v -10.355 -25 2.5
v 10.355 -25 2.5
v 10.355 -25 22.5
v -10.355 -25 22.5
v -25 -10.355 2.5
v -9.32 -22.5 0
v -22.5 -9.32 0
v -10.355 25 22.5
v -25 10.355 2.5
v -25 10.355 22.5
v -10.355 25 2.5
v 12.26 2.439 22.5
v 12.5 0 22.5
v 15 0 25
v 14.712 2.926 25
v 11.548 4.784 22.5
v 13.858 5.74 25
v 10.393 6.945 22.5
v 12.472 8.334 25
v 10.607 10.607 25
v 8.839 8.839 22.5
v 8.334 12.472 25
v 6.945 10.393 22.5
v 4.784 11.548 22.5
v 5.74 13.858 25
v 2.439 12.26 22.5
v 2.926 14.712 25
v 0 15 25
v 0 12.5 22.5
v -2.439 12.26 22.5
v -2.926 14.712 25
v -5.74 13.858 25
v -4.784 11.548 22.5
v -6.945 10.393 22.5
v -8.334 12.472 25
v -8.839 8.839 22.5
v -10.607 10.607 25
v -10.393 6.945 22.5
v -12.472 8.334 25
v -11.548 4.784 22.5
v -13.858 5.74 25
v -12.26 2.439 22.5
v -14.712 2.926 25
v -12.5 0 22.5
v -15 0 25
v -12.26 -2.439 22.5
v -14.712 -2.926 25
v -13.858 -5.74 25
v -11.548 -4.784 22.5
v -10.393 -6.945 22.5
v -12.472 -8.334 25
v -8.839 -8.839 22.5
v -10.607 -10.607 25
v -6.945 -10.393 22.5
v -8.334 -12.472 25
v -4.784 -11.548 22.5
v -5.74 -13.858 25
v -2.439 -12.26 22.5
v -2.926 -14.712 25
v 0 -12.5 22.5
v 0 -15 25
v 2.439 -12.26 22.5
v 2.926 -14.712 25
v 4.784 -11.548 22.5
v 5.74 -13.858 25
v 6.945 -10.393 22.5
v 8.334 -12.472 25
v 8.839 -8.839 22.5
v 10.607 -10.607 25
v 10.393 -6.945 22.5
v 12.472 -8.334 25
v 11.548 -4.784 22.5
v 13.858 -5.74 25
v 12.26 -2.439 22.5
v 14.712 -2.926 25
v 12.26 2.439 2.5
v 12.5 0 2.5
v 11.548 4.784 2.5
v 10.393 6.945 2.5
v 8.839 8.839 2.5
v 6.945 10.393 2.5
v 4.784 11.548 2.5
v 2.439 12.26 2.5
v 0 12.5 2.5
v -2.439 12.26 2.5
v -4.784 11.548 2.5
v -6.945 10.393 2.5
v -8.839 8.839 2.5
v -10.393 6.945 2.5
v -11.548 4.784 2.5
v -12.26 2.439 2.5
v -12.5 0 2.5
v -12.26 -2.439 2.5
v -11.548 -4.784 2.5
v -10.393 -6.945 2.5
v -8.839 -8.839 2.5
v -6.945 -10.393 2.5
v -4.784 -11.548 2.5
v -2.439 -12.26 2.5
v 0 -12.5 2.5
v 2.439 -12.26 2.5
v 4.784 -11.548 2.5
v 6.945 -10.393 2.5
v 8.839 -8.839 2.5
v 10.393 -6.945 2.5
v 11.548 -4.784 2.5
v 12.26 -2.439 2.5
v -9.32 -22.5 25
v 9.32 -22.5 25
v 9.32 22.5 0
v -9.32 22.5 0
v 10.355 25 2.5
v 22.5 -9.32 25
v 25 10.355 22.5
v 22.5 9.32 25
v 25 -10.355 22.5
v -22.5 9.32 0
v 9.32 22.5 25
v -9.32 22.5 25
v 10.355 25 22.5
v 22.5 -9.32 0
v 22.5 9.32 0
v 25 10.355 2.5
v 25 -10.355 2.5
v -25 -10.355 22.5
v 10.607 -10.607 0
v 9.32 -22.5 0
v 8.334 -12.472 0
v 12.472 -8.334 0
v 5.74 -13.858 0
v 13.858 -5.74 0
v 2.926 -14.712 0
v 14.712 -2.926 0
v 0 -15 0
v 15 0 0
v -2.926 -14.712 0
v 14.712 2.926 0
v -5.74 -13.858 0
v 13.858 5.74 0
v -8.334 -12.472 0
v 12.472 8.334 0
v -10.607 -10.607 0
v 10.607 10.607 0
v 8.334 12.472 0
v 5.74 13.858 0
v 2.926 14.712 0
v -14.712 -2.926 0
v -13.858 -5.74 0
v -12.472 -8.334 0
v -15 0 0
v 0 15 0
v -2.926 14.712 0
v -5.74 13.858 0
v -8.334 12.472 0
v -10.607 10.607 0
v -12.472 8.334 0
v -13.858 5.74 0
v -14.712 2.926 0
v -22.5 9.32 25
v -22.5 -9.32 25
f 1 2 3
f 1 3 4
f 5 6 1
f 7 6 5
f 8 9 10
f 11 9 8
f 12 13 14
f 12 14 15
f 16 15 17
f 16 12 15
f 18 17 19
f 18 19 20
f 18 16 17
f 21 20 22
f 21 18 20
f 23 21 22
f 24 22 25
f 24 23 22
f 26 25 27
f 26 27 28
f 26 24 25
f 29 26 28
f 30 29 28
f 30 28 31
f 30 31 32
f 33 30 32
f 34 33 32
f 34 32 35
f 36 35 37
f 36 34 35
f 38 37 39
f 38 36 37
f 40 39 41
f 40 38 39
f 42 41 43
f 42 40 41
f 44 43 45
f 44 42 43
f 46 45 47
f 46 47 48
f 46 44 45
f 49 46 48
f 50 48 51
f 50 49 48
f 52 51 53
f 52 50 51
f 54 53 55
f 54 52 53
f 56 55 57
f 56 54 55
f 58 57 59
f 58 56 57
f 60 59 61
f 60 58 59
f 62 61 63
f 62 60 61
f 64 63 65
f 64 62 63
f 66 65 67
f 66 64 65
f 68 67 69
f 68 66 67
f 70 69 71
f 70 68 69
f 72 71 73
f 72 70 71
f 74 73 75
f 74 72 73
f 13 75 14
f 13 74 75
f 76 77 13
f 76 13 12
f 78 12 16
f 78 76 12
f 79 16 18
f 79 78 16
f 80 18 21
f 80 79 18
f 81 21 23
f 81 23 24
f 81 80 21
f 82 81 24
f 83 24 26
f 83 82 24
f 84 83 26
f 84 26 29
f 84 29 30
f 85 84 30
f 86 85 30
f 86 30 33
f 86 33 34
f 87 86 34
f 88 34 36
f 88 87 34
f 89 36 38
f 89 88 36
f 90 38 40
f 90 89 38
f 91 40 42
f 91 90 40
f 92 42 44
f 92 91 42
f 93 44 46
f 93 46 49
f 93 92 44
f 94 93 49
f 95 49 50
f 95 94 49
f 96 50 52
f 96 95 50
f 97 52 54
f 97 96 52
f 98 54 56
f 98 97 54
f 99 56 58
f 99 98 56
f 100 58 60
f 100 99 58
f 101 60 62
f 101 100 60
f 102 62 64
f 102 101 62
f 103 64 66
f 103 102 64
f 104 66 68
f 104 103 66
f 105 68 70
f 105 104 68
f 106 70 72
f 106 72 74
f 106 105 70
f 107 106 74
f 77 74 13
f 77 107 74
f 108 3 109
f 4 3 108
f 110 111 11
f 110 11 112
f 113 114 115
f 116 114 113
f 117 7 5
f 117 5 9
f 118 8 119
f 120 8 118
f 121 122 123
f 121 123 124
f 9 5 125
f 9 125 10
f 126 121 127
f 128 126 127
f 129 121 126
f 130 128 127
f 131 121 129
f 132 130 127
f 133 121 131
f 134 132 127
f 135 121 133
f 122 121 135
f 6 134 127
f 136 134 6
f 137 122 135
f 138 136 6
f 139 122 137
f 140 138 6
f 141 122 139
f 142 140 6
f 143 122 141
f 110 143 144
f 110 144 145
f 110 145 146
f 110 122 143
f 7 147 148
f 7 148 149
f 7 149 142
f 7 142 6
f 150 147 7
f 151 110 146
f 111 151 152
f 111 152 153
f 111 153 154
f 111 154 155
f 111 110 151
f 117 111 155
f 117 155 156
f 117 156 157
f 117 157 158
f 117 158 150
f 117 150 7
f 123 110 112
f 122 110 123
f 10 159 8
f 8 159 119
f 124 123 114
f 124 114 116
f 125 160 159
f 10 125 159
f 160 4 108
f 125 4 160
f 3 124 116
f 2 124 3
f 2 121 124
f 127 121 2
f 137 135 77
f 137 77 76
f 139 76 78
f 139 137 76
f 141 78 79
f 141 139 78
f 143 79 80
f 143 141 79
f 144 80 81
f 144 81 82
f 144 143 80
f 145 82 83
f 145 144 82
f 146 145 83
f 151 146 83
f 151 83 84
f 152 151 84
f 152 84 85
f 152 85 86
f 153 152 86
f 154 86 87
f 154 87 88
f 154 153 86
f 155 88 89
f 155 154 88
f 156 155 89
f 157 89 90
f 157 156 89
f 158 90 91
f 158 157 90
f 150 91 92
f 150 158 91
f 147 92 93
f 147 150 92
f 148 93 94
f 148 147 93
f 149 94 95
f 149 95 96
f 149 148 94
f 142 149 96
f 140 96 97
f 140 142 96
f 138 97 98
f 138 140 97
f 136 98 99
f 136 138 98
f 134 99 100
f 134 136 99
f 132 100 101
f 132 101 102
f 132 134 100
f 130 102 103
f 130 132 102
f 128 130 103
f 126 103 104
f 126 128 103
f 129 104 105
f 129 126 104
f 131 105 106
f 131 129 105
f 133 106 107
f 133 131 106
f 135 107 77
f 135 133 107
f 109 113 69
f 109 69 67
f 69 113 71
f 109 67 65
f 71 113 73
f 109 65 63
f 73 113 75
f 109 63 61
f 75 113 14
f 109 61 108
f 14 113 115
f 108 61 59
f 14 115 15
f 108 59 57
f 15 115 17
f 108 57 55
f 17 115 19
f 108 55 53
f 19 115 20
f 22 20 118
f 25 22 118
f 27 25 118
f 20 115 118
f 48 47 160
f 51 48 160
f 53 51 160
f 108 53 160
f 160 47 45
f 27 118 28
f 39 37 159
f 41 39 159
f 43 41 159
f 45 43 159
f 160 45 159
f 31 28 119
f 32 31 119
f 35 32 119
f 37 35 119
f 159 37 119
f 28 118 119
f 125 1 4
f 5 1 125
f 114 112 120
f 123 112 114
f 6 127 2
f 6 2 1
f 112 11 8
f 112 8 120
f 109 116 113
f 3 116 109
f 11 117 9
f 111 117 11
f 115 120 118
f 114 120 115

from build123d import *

# Parameters (mm, degrees)
SKETCH2_R      = 12.5
EXTRUDE2_DEPTH = 25
CHAMFER3_SIZE  = 2.5
CHAMFER4_SIZE  = 2.5


with BuildPart() as part:
    # Sketch2 → Extrude2 (new body)
    with BuildSketch(Plane.XY):
        Polygon((-25, 10.355339059), (-10.355339059, 25), (10.355339059, 25), (25, 10.355339059), (25, -10.355339059), (10.355339059, -25), (-10.355339059, -25), (-25, -10.355339059), align=None)
        Circle(SKETCH2_R, mode=Mode.SUBTRACT)
    extrude(amount=EXTRUDE2_DEPTH)

    # Chamfer3
    chamfer3_edges = [part.edges().sort_by_distance(p)[0] for p in [
        (-12.5, 0, 0),
        (17.67766953, 17.67766953, 0),
        (25, 0, 0),
        (17.67766953, -17.67766953, 0),
        (0, -25, 0),
        (-17.67766953, -17.67766953, 0),
        (-25, 0, 0),
        (-17.67766953, 17.67766953, 0),
        (0, 25, 0),
    ]]
    chamfer(chamfer3_edges, length=CHAMFER3_SIZE)

    # Chamfer4
    chamfer4_edges = [part.edges().sort_by_distance(p)[0] for p in [
        (-25, 0, 25),
        (-17.67766953, -17.67766953, 25),
        (0, -25, 25),
        (17.67766953, -17.67766953, 25),
        (-12.5, 0, 25),
        (25, 0, 25),
        (17.67766953, 17.67766953, 25),
        (0, 25, 25),
        (-17.67766953, 17.67766953, 25),
    ]]
    chamfer(chamfer4_edges, length=CHAMFER4_SIZE)


solid = part.part
